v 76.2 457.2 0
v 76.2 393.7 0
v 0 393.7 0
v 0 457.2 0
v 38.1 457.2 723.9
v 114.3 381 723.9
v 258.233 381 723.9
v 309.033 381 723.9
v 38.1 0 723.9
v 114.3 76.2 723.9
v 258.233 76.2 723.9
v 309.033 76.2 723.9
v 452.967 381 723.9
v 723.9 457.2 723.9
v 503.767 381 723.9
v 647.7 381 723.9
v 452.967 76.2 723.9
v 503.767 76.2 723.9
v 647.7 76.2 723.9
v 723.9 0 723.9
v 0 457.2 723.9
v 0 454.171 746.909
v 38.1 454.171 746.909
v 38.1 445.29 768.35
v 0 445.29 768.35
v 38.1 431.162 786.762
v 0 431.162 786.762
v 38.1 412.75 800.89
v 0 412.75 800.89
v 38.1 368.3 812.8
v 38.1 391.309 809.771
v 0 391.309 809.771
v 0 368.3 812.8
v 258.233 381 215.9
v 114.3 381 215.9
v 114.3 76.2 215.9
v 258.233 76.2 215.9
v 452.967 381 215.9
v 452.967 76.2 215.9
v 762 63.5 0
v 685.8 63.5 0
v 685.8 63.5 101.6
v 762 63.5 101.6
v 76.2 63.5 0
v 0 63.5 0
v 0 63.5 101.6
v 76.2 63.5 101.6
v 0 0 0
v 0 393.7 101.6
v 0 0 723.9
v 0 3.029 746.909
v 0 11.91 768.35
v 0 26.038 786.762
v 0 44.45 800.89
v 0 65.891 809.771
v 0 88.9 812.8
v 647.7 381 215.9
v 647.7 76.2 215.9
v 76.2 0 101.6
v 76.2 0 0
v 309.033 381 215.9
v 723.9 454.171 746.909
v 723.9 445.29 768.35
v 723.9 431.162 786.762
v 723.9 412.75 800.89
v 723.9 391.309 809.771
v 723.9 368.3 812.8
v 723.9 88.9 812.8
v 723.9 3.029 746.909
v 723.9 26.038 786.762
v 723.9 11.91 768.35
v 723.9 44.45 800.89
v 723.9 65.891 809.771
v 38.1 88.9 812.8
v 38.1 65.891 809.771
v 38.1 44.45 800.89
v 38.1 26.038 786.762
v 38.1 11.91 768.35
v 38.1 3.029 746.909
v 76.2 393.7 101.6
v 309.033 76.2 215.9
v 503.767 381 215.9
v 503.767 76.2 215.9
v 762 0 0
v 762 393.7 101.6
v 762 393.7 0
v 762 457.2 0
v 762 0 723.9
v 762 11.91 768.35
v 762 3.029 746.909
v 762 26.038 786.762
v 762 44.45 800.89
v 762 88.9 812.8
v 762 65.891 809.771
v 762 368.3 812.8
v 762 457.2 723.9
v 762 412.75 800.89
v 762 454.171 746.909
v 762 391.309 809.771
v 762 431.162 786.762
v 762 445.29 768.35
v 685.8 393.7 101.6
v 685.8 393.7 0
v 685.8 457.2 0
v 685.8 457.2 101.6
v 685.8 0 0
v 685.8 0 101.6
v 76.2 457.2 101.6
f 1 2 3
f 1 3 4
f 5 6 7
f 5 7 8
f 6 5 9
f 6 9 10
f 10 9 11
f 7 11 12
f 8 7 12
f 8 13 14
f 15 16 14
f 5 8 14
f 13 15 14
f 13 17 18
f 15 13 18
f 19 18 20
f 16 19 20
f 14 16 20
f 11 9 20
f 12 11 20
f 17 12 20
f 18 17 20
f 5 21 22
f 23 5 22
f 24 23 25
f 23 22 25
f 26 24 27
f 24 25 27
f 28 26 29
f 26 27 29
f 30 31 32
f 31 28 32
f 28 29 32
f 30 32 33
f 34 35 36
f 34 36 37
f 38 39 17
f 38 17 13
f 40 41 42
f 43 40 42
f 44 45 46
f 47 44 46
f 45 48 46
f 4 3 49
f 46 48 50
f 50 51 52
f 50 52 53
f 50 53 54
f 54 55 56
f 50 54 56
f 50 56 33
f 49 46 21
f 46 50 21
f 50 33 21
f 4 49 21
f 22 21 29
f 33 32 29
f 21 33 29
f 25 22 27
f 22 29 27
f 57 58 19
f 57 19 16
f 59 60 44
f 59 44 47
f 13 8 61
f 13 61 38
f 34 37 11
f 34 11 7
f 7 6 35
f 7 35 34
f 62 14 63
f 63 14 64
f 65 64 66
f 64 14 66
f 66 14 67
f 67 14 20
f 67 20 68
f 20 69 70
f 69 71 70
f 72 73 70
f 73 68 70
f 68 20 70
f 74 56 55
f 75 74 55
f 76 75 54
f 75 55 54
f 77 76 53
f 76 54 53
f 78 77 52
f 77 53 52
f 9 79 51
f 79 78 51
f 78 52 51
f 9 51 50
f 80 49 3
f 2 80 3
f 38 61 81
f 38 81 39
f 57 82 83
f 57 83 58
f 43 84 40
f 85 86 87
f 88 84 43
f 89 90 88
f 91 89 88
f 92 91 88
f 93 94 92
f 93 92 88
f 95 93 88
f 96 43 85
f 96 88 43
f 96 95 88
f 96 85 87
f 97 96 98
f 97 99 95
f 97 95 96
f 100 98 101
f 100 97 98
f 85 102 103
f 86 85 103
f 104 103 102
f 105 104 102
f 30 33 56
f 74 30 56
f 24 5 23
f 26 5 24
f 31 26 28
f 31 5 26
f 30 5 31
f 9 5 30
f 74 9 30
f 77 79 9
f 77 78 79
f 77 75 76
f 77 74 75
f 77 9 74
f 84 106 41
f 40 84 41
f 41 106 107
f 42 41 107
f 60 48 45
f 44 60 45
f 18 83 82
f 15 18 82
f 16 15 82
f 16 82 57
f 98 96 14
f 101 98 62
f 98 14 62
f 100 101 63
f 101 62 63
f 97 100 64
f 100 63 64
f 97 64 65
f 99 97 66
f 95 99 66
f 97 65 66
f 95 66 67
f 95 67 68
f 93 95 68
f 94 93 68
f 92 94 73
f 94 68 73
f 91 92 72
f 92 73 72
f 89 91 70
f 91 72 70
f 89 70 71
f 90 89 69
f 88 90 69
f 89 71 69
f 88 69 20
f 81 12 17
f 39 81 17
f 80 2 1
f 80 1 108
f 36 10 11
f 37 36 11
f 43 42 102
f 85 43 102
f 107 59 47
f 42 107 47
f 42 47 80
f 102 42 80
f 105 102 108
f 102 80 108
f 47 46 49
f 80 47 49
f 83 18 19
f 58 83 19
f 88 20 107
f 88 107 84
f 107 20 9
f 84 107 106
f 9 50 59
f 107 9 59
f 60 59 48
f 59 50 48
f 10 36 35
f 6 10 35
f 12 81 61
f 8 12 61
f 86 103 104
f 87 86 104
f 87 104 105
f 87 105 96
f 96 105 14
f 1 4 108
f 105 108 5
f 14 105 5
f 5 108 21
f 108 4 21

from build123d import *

# Parameters (mm, degrees)
F1_DEPTH = 762
F2_W     = 685.8
F2_H     = 88.9
F2_W_2   = 609.6
F2_H_2   = 101.6
F3_DEPTH = 457.201
F4_W     = 143.9333333333
F4_H     = 304.8
F5_DEPTH = 508


with BuildPart() as f1:
    # F0 (on Right) → F1 (new body)
    with BuildSketch(Plane.YZ):
        with BuildLine():
            ThreePointArc((88.9, 812.8), (26.0382071525, 786.7617928475), (0, 723.9))
            Line((0, 723.9), (457.2, 723.9))
            ThreePointArc((457.2, 723.9), (431.1617928475, 786.7617928475), (368.3, 812.8))
            Line((368.3, 812.8), (88.9, 812.8))
        make_face()
        Polygon((0, 723.9), (0, 0), (63.5, 0), (63.5, 101.6), (393.7, 101.6), (393.7, 0), (457.2, 0), (457.2, 723.9), align=None)
    extrude(amount=F1_DEPTH)

    # F2 (on face) → F3 (cut, through all)
    with BuildSketch(Plane.XZ):
        with Locations((381, 768.35)):
            Rectangle(F2_W, F2_H)
        with Locations((381, 50.8)):
            Rectangle(F2_W_2, F2_H_2)
    extrude(amount=-F3_DEPTH, mode=Mode.SUBTRACT)

    # F4 (on face) → F5 (cut)
    with BuildSketch(Plane.XY.offset(723.9)):
        with Locations((186.2666666667, 228.6)):
            Rectangle(F4_W, F4_H)
        with Locations((381, 228.6)):
            Rectangle(F4_W, F4_H)
        with Locations((575.7333333333, 228.6)):
            Rectangle(F4_W, F4_H)
    extrude(amount=-F5_DEPTH, mode=Mode.SUBTRACT)


solid = f1.part
